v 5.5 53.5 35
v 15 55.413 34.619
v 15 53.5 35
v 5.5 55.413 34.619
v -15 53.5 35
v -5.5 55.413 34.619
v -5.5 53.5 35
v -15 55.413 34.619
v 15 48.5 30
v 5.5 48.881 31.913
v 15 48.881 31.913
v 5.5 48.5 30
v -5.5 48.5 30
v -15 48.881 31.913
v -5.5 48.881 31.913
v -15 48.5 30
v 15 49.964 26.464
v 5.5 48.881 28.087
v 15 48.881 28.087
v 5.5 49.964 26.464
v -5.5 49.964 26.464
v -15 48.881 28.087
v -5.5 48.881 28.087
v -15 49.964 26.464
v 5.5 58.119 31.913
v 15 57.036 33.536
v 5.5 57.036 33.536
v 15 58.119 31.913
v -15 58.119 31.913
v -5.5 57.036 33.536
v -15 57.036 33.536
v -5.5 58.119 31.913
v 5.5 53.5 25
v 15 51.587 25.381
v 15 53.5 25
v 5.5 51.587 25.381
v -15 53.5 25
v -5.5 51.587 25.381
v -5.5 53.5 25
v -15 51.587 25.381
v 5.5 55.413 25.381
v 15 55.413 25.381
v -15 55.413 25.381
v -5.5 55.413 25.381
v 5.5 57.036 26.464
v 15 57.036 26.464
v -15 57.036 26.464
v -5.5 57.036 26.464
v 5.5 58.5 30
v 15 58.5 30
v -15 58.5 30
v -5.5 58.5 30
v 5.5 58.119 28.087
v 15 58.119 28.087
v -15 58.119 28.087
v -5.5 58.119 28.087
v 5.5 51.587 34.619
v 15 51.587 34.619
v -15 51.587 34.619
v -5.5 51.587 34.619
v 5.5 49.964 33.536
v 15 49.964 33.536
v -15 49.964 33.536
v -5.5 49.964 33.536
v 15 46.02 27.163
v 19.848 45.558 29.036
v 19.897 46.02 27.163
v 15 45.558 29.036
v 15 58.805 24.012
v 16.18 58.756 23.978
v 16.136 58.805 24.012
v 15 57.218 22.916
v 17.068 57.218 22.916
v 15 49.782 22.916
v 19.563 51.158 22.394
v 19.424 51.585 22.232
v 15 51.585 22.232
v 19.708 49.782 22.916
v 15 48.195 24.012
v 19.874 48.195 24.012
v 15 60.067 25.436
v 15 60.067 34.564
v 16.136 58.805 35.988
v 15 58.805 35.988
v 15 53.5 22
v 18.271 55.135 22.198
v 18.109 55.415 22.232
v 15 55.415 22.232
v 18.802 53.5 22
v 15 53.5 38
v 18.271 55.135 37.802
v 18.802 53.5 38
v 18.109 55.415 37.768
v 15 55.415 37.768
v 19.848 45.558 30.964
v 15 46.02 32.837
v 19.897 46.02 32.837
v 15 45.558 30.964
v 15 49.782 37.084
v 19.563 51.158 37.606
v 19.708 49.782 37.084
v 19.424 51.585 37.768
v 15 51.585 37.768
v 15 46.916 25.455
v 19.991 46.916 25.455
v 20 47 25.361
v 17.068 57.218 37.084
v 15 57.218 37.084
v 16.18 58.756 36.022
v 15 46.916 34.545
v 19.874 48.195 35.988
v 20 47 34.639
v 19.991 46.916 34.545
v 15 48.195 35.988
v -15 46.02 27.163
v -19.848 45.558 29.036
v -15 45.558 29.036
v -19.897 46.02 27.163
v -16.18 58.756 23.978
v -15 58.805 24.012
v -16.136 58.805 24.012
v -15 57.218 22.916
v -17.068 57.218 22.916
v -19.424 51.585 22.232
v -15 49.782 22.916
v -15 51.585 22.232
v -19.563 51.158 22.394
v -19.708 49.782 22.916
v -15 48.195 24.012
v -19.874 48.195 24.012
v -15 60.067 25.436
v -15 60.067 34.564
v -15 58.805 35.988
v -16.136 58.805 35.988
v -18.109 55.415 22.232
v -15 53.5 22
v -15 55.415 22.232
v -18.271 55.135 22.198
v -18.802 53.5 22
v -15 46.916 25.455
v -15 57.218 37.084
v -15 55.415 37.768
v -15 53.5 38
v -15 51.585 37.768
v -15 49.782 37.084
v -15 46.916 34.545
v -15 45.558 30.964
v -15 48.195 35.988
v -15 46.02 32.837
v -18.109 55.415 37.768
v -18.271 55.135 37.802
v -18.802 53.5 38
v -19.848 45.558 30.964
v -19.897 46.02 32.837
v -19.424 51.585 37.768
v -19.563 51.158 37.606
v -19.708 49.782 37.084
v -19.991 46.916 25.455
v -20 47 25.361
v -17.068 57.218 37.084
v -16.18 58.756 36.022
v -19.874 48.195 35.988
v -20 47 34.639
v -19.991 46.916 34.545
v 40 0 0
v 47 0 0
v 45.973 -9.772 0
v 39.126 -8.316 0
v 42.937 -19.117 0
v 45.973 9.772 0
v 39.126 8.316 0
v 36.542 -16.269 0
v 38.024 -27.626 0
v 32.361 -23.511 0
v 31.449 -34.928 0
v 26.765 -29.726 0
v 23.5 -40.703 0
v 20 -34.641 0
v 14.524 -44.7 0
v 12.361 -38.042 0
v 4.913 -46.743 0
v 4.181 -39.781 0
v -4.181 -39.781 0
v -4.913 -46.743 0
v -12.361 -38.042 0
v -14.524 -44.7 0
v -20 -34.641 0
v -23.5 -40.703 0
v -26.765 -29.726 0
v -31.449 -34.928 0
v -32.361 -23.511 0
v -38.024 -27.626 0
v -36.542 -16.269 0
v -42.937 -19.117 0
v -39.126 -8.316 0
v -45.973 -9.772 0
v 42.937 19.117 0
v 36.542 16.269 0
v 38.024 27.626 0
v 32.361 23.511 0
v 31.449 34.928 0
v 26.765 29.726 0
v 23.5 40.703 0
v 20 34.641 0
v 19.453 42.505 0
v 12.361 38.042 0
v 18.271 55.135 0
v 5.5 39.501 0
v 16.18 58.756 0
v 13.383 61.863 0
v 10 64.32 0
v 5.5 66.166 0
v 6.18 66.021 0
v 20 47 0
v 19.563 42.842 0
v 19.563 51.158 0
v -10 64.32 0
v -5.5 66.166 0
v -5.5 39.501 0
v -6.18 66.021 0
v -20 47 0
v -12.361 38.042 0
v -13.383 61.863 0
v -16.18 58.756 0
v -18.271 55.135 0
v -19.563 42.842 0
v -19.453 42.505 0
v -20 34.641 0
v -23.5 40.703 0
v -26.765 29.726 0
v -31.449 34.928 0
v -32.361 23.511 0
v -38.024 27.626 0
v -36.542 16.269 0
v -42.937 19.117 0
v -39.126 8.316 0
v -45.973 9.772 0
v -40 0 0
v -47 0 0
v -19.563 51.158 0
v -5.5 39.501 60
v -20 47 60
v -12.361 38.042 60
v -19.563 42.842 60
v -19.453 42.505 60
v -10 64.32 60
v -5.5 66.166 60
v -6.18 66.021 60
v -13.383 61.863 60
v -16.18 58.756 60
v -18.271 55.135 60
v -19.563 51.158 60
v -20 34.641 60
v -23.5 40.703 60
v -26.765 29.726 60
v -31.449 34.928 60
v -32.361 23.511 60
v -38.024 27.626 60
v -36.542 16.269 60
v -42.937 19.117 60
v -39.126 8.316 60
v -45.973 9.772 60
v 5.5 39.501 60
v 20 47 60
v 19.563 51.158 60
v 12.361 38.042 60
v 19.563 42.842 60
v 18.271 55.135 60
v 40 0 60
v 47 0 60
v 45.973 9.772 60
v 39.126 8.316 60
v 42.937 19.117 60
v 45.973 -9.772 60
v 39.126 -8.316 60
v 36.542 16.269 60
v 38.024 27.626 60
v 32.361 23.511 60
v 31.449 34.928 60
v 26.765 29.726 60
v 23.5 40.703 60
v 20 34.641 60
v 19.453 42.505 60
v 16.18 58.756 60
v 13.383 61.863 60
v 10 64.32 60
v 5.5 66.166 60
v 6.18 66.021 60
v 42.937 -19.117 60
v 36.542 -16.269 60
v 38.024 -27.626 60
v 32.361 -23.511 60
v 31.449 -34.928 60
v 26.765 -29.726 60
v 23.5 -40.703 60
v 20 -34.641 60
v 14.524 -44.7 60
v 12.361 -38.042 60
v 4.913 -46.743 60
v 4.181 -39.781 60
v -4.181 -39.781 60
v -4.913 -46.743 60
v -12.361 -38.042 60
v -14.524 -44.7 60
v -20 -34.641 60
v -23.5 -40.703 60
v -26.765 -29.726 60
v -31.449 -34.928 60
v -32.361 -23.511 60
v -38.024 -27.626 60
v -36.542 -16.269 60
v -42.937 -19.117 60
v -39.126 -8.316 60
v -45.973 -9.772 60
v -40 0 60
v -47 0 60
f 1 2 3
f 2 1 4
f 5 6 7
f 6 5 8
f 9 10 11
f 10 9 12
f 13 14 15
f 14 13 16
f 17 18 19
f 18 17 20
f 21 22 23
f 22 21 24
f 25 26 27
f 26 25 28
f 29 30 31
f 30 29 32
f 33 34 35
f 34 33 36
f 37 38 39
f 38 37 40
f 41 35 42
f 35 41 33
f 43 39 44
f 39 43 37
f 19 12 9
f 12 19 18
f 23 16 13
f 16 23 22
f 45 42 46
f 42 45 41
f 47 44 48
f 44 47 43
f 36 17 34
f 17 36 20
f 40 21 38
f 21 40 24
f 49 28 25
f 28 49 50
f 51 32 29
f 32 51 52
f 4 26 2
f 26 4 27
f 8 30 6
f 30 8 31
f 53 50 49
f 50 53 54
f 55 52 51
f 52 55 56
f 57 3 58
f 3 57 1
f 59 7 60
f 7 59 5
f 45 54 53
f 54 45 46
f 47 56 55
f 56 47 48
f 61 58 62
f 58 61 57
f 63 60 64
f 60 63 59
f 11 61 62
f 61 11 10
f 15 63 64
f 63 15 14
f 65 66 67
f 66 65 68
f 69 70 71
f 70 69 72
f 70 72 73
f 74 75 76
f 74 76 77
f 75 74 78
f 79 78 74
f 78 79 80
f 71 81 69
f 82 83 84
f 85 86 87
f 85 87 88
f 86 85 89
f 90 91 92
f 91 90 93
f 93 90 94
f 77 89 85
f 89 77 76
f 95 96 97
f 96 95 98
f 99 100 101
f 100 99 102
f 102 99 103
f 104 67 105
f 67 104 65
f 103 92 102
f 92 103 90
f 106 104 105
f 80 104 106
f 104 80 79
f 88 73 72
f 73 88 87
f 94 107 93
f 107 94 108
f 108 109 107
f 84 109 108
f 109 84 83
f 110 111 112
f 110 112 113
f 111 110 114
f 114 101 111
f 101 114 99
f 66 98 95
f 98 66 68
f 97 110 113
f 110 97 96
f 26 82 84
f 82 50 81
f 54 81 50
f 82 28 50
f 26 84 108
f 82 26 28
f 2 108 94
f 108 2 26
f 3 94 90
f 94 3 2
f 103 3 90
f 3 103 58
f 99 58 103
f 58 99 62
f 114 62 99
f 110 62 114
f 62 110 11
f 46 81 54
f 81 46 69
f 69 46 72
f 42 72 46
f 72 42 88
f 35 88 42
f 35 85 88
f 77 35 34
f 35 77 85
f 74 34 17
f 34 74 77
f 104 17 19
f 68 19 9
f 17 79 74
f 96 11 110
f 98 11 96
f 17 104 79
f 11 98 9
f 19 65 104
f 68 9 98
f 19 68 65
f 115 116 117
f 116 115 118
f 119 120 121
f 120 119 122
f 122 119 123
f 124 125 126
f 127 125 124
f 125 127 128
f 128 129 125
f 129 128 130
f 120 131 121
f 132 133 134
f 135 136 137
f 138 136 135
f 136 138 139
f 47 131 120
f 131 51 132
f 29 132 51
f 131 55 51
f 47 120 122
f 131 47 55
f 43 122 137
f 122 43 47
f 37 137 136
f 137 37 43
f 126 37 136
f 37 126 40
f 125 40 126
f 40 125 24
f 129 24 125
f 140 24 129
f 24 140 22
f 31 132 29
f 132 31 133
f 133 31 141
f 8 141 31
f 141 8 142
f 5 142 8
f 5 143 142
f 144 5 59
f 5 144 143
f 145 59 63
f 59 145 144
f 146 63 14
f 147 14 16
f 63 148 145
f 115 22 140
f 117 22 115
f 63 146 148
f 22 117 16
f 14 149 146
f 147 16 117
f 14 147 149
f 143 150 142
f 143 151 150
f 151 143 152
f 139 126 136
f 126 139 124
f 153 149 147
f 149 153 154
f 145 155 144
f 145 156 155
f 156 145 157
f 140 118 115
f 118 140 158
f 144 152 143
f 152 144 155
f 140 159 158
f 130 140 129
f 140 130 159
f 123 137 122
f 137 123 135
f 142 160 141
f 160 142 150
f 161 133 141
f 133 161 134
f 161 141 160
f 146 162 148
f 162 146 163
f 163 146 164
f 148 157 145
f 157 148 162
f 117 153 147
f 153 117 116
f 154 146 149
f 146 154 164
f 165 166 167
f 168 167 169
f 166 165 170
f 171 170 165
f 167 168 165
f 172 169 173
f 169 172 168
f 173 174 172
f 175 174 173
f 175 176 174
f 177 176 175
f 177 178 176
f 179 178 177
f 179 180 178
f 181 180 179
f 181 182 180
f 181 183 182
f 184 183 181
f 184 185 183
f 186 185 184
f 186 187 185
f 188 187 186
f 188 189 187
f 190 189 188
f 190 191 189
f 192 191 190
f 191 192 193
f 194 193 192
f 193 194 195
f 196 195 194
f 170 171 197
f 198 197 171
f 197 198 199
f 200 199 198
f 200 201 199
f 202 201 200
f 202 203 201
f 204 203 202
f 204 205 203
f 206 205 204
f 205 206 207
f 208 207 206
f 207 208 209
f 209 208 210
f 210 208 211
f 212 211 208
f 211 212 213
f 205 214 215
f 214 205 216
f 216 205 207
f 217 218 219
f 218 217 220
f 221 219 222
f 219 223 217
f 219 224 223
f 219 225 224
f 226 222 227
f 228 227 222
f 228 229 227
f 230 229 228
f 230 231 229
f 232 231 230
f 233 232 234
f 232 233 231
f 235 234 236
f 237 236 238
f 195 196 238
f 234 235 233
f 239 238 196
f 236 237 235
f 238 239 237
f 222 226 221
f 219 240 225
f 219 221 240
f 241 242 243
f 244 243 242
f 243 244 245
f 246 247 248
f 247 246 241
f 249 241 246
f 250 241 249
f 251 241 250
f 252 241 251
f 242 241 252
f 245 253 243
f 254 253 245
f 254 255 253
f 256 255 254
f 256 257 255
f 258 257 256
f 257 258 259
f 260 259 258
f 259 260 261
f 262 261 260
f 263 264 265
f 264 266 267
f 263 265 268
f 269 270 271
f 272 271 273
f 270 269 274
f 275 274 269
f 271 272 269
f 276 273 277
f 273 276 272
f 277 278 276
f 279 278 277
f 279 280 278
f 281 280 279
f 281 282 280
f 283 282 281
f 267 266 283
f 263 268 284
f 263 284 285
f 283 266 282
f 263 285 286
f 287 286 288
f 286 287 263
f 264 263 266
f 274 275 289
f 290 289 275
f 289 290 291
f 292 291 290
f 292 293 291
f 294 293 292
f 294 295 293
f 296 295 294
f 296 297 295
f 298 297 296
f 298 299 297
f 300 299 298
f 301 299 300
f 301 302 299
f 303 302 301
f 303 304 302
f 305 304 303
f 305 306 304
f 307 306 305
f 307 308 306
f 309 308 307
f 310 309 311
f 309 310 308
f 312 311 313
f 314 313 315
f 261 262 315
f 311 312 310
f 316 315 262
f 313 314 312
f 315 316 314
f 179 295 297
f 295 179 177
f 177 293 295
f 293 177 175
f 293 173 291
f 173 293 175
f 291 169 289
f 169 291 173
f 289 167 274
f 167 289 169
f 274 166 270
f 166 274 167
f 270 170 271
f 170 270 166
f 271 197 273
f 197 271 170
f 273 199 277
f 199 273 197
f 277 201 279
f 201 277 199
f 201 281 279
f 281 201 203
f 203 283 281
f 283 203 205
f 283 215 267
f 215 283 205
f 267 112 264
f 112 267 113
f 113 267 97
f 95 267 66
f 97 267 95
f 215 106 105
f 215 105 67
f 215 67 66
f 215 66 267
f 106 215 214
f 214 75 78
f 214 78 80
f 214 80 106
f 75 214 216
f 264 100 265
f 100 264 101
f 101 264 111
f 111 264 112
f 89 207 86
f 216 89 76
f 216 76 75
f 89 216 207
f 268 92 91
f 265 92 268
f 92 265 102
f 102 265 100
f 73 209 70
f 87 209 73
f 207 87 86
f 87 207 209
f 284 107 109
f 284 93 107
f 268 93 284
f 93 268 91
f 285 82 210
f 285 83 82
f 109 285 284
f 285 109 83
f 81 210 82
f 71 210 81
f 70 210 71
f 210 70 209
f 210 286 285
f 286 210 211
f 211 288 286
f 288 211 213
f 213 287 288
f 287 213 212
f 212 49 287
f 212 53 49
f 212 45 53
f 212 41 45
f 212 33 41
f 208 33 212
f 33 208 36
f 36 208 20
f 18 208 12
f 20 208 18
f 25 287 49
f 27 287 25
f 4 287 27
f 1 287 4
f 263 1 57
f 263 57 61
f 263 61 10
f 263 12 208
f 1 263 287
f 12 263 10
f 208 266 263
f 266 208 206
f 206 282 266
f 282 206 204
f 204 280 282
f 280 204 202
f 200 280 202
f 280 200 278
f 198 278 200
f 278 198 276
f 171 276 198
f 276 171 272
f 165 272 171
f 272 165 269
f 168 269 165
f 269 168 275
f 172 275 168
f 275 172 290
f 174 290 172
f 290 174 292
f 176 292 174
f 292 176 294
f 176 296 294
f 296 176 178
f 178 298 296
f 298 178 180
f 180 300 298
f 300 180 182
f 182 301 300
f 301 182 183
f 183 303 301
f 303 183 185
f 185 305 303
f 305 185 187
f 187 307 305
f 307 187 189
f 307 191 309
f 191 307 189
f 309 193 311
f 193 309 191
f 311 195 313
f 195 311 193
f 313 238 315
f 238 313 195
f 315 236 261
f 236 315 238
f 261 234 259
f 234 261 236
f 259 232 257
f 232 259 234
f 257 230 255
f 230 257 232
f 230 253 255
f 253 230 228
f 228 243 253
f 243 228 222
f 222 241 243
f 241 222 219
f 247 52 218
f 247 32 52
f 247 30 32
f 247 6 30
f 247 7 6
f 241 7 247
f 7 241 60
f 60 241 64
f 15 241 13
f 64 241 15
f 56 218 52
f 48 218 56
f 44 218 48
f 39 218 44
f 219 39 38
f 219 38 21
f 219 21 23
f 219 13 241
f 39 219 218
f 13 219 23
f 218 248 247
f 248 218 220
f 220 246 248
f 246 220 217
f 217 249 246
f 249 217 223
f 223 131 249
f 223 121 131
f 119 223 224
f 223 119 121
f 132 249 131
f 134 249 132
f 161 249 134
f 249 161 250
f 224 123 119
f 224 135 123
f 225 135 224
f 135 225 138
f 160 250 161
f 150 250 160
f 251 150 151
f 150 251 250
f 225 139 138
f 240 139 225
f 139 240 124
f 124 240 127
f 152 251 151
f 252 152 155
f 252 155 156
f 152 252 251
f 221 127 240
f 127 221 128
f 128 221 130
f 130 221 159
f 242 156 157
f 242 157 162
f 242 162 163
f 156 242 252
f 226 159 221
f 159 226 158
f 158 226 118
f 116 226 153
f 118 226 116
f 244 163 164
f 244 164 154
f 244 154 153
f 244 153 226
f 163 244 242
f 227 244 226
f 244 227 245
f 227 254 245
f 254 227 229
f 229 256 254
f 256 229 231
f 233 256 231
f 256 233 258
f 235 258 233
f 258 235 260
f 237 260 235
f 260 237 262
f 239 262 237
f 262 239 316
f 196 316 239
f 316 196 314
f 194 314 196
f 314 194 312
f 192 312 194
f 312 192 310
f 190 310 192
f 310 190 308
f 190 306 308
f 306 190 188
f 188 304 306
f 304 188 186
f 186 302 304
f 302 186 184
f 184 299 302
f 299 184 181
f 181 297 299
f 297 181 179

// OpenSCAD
// clasp
clasp_length = 60;
inner_radius = 40;
tube_thickness = 7;
compression_gap = 10;
clasp_size = 20;

// bolt
depth = 10;
washer_size = 8;
bolt_size = 5;

difference()
{
  // main clasp body
  linear_extrude(height=clasp_length)
  {
    // tube with a compression gap
    difference()
    {
      // a tube
      difference()
      {
        union()
        {
          circle(r=inner_radius+tube_thickness);
          translate([0, inner_radius+tube_thickness, 0]) circle(r=clasp_size);
        }
        circle(r=inner_radius);

      }
      // compression gap in the tube
      translate([0,inner_radius + tube_thickness,0])
        square(
          [
            compression_gap+1,
            clasp_size*2 + 1
          ]
          , center=true
        );
    }
  }
  // washer recesses and drilled out hole
  union() {
    translate([
      0,
      inner_radius+(tube_thickness+clasp_size)/2,
      clasp_length/2
    ])
    rotate([0,90,0]) cylinder(r=bolt_size, h=clasp_size*2, center=true);

    translate([
      clasp_size,
      inner_radius+(tube_thickness+clasp_size)/2,
      clasp_length/2]
    ) rotate([0,90,0])
        cylinder(h=depth,r=washer_size,center=true);
    translate([
      -clasp_size,
      inner_radius+(tube_thickness+clasp_size)/2,
      clasp_length/2]
    ) rotate([0,90,0])
        cylinder(h=depth,r=washer_size,center=true);
  }
}
